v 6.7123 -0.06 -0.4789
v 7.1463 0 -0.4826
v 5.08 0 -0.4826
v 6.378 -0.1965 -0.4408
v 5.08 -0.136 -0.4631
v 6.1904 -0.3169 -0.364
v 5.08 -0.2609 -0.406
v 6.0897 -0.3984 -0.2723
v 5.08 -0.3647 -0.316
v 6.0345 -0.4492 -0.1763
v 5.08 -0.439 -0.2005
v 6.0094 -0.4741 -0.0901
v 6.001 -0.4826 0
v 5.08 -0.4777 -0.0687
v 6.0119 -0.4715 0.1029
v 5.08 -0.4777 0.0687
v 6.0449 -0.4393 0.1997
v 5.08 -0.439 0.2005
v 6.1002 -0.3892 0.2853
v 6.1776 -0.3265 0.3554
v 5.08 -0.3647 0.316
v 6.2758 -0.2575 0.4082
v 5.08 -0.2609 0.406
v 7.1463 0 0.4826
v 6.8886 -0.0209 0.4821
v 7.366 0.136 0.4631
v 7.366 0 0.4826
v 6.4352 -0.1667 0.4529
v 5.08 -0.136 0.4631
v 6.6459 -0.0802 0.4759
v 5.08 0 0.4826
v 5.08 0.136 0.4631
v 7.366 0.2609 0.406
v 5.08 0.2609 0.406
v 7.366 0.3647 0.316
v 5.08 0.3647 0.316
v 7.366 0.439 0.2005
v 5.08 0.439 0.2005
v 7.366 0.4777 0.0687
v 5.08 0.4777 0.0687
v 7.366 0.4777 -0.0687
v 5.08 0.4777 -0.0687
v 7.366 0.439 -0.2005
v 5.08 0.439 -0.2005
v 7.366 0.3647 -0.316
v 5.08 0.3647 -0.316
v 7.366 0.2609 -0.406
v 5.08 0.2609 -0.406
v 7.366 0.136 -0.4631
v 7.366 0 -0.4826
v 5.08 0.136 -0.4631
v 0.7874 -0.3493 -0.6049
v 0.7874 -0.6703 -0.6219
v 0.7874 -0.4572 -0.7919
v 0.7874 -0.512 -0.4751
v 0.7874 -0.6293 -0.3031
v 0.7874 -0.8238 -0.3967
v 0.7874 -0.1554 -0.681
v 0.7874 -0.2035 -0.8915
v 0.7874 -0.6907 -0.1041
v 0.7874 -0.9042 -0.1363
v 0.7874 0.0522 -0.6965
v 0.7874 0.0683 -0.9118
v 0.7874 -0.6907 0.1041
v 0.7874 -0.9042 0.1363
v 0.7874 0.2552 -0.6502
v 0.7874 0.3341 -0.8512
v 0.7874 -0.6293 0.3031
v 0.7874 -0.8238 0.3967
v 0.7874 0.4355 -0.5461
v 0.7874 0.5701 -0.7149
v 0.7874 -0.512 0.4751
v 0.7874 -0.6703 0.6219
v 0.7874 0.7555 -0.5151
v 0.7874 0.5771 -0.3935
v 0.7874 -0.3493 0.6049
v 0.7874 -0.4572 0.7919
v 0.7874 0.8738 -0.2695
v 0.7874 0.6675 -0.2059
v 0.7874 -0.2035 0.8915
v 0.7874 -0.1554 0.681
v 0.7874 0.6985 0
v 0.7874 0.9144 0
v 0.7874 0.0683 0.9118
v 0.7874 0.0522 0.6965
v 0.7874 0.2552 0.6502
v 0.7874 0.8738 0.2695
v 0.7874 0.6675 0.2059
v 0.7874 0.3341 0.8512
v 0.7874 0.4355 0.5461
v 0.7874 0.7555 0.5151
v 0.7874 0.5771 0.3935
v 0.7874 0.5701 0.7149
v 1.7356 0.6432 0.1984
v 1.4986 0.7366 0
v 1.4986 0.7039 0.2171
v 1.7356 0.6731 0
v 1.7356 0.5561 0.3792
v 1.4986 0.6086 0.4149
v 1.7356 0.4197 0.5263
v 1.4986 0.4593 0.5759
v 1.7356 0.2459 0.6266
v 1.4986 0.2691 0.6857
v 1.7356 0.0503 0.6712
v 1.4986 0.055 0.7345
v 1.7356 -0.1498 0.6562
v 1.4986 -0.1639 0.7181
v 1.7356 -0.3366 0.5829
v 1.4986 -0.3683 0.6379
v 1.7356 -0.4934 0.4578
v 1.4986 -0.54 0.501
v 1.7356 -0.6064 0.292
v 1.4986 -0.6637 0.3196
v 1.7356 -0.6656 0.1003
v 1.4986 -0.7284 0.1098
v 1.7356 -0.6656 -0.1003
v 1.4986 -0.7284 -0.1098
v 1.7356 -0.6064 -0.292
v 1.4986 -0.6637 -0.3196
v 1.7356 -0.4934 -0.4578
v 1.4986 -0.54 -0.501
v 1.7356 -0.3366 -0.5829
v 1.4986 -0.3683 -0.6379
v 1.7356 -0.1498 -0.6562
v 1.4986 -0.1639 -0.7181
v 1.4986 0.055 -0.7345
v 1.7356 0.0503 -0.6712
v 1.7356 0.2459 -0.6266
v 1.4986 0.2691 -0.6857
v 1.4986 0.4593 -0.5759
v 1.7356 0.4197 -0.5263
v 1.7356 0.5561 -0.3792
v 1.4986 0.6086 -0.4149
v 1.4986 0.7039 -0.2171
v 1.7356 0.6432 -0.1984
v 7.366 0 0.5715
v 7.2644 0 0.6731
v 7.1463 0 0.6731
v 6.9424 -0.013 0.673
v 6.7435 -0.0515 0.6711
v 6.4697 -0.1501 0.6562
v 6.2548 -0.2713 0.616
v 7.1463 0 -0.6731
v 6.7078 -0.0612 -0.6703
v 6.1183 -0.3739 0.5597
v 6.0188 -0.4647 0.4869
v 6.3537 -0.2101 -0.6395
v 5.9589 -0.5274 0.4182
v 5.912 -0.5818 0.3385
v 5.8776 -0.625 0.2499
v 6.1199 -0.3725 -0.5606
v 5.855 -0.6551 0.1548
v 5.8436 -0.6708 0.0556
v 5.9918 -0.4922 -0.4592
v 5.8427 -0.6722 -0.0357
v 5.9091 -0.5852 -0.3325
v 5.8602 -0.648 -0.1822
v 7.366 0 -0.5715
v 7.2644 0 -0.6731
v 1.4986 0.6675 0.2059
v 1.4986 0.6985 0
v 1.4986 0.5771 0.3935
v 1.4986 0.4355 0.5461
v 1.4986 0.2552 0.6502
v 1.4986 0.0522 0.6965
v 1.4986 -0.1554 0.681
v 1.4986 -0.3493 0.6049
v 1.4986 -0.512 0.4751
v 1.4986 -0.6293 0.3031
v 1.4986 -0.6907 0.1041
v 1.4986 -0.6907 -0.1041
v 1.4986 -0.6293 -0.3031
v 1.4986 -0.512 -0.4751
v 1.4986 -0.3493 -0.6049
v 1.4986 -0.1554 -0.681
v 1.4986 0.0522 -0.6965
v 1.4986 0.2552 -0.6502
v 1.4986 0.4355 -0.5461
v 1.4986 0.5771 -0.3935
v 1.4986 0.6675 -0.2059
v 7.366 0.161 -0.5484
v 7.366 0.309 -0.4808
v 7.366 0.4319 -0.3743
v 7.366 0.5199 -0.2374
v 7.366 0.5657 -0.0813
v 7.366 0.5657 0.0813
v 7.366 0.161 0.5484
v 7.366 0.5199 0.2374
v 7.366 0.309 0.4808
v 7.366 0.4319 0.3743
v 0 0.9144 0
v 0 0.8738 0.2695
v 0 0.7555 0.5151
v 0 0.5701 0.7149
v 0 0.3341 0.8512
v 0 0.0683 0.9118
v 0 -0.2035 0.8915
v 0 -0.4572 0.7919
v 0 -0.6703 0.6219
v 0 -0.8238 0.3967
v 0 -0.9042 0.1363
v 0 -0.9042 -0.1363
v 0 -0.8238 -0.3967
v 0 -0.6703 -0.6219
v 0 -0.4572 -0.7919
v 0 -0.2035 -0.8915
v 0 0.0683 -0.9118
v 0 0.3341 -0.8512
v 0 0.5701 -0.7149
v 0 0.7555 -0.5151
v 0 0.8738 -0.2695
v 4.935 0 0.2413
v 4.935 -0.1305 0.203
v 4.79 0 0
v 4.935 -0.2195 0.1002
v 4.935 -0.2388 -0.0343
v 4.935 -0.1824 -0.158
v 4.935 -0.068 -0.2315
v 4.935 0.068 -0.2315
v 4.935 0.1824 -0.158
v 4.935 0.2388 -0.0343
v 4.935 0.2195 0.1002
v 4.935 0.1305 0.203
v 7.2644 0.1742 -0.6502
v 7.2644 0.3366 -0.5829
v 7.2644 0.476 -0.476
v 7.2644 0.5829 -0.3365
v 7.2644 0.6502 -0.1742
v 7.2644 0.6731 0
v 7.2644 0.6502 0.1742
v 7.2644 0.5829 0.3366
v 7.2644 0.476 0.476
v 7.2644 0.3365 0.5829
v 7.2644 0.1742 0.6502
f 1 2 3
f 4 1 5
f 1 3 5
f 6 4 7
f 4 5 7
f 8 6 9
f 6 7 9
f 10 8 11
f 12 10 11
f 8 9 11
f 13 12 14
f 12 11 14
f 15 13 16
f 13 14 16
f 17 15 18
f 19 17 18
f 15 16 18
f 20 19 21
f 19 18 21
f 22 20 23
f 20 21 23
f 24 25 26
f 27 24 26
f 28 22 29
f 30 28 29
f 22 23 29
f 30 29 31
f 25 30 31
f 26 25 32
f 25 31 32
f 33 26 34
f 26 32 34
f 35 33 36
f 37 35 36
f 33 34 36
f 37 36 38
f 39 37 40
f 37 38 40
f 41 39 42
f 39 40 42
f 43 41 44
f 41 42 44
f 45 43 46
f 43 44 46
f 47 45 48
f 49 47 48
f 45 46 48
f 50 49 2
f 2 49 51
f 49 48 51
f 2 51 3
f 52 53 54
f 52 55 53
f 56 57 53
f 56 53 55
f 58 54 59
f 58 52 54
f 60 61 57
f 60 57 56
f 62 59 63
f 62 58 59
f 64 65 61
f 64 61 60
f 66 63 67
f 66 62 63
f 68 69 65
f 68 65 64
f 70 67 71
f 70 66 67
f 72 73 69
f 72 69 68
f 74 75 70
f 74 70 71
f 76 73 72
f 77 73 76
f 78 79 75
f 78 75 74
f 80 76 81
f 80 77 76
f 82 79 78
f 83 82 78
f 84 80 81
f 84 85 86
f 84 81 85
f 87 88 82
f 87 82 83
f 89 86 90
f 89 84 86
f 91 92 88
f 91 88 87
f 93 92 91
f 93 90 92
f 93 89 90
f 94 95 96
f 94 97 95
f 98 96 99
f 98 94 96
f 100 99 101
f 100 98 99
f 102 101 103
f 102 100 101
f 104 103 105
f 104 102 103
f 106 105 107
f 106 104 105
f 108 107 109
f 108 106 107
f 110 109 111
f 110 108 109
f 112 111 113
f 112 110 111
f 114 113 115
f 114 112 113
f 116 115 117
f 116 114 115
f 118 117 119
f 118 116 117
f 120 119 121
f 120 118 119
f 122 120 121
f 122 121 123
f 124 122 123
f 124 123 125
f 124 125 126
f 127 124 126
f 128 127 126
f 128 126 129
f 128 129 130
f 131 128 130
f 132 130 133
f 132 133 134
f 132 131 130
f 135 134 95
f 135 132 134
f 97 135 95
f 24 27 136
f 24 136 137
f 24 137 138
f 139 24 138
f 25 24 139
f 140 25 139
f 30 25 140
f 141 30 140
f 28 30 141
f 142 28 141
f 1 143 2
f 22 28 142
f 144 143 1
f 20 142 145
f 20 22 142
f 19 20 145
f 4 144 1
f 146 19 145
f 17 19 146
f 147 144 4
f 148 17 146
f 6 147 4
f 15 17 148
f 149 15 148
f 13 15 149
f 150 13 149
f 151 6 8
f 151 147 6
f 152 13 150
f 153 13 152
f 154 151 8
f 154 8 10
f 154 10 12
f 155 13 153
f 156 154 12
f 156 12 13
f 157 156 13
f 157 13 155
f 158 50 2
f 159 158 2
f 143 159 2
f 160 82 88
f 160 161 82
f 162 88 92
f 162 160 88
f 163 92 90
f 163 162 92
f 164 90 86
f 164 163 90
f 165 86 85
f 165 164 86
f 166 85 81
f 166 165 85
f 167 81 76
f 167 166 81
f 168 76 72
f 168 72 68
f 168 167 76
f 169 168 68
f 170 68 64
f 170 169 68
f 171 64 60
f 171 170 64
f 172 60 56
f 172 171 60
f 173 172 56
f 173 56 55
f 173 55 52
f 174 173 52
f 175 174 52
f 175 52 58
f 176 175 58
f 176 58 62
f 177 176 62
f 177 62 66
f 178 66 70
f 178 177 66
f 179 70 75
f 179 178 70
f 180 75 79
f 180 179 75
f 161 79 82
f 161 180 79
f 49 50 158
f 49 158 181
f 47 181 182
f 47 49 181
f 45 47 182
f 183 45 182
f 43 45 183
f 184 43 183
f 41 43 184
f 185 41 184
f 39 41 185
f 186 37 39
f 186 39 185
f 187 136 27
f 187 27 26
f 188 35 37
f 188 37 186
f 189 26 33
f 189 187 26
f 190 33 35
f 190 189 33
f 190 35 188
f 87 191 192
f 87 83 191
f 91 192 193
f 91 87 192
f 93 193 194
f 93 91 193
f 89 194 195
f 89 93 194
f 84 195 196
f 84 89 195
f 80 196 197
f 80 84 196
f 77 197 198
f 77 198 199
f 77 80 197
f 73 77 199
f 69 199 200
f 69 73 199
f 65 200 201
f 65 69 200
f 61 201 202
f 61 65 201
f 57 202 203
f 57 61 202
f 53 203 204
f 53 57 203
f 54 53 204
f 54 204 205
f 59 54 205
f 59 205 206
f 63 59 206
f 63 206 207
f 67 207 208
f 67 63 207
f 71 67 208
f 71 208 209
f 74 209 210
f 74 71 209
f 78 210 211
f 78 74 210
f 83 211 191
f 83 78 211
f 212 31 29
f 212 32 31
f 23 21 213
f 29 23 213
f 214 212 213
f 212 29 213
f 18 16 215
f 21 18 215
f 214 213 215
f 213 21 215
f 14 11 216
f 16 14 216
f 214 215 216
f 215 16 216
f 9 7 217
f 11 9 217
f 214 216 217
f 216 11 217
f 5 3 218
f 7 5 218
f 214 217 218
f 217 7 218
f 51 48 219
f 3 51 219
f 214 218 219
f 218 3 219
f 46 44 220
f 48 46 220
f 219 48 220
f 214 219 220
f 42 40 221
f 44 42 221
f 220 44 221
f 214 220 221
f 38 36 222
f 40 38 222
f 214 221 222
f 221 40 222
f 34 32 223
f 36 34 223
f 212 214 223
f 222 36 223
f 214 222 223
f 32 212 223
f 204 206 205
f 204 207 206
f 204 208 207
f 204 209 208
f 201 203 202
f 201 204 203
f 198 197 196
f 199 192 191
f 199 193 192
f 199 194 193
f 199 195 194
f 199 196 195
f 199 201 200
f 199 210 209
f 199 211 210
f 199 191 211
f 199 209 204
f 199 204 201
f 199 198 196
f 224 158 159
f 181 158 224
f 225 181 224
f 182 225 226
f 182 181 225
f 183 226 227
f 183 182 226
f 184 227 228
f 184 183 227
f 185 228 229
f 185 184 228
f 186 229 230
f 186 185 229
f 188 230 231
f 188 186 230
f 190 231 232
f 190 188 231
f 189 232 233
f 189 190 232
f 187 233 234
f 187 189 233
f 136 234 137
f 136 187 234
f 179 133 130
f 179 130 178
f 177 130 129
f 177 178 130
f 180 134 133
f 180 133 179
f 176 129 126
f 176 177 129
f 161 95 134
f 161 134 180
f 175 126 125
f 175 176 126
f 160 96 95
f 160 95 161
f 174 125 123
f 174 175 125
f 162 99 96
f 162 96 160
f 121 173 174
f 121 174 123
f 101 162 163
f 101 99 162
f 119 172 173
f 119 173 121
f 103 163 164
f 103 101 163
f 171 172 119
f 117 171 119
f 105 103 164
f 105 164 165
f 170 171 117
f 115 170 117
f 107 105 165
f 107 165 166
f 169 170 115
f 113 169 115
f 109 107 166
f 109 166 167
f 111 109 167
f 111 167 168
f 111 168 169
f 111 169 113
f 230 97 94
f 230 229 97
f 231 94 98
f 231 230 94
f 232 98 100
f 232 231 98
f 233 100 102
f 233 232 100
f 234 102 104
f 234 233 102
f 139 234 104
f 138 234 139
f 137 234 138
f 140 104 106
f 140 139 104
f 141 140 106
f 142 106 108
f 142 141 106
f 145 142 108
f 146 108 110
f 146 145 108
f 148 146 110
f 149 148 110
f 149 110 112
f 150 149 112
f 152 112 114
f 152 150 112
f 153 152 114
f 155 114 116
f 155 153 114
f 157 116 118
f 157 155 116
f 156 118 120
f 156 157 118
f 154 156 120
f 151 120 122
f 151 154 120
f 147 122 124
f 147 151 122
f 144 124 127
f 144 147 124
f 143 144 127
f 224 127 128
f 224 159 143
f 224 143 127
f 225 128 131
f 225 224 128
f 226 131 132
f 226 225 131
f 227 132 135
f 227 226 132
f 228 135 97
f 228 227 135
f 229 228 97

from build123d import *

# Parameters (mm, degrees)
HOLE1_D             = 0.9652
HOLE1_DEPTH         = 2.286
HOLE1_TIP           = 0.289975335
EXTRUDE1_DEPTH      = 0.6731
EXTRUDE1_DEPTH_BACK = 0.6731


with BuildPart() as part:
    # Sketch1 → RevolutionAngle1 (revolve)
    with BuildSketch(Plane.XY):
        Polygon((7.2644, 0.6731), (7.366, 0.5715), (7.366, 0), (0, 0), (0, 0.9144), (0.7874, 0.9144), (0.7874, 0.6985), (1.4986, 0.6985), (1.4986, 0.7366), (1.735585226, 0.6731), align=None)
    revolve(axis=Axis((0, 0, 0), (1, 0, 0)))

    # Hole1
    with Locations(Plane(origin=(7.366, 0, 0), x_dir=(0, 0, 1), z_dir=(1, 0, 0))):
        with Locations((0, 0)):
            Hole(HOLE1_D / 2, depth=HOLE1_DEPTH)
            with Locations((0, 0, -(HOLE1_DEPTH + HOLE1_TIP / 2))):  # 118° drill point
                Cone(0, HOLE1_D / 2, HOLE1_TIP, mode=Mode.SUBTRACT)

    # Sketch6 → Extrude1 (cut, two sides: drawn at the far end of the back side and taken through both)
    with BuildSketch(Plane.XY.offset(-EXTRUDE1_DEPTH_BACK)):
        with BuildLine():
            Line((5.842, -0.6731), (7.366, -0.6731))
            Line((7.366, -0.6731), (7.366, 0))
            Line((7.366, 0), (7.146272069, 0))
            ThreePointArc((7.146272069, 0), (6.412414242, -0.17819693), (5.842, -0.6731))
        make_face()
    extrude(amount=EXTRUDE1_DEPTH + EXTRUDE1_DEPTH_BACK, mode=Mode.SUBTRACT)


solid = part.part
